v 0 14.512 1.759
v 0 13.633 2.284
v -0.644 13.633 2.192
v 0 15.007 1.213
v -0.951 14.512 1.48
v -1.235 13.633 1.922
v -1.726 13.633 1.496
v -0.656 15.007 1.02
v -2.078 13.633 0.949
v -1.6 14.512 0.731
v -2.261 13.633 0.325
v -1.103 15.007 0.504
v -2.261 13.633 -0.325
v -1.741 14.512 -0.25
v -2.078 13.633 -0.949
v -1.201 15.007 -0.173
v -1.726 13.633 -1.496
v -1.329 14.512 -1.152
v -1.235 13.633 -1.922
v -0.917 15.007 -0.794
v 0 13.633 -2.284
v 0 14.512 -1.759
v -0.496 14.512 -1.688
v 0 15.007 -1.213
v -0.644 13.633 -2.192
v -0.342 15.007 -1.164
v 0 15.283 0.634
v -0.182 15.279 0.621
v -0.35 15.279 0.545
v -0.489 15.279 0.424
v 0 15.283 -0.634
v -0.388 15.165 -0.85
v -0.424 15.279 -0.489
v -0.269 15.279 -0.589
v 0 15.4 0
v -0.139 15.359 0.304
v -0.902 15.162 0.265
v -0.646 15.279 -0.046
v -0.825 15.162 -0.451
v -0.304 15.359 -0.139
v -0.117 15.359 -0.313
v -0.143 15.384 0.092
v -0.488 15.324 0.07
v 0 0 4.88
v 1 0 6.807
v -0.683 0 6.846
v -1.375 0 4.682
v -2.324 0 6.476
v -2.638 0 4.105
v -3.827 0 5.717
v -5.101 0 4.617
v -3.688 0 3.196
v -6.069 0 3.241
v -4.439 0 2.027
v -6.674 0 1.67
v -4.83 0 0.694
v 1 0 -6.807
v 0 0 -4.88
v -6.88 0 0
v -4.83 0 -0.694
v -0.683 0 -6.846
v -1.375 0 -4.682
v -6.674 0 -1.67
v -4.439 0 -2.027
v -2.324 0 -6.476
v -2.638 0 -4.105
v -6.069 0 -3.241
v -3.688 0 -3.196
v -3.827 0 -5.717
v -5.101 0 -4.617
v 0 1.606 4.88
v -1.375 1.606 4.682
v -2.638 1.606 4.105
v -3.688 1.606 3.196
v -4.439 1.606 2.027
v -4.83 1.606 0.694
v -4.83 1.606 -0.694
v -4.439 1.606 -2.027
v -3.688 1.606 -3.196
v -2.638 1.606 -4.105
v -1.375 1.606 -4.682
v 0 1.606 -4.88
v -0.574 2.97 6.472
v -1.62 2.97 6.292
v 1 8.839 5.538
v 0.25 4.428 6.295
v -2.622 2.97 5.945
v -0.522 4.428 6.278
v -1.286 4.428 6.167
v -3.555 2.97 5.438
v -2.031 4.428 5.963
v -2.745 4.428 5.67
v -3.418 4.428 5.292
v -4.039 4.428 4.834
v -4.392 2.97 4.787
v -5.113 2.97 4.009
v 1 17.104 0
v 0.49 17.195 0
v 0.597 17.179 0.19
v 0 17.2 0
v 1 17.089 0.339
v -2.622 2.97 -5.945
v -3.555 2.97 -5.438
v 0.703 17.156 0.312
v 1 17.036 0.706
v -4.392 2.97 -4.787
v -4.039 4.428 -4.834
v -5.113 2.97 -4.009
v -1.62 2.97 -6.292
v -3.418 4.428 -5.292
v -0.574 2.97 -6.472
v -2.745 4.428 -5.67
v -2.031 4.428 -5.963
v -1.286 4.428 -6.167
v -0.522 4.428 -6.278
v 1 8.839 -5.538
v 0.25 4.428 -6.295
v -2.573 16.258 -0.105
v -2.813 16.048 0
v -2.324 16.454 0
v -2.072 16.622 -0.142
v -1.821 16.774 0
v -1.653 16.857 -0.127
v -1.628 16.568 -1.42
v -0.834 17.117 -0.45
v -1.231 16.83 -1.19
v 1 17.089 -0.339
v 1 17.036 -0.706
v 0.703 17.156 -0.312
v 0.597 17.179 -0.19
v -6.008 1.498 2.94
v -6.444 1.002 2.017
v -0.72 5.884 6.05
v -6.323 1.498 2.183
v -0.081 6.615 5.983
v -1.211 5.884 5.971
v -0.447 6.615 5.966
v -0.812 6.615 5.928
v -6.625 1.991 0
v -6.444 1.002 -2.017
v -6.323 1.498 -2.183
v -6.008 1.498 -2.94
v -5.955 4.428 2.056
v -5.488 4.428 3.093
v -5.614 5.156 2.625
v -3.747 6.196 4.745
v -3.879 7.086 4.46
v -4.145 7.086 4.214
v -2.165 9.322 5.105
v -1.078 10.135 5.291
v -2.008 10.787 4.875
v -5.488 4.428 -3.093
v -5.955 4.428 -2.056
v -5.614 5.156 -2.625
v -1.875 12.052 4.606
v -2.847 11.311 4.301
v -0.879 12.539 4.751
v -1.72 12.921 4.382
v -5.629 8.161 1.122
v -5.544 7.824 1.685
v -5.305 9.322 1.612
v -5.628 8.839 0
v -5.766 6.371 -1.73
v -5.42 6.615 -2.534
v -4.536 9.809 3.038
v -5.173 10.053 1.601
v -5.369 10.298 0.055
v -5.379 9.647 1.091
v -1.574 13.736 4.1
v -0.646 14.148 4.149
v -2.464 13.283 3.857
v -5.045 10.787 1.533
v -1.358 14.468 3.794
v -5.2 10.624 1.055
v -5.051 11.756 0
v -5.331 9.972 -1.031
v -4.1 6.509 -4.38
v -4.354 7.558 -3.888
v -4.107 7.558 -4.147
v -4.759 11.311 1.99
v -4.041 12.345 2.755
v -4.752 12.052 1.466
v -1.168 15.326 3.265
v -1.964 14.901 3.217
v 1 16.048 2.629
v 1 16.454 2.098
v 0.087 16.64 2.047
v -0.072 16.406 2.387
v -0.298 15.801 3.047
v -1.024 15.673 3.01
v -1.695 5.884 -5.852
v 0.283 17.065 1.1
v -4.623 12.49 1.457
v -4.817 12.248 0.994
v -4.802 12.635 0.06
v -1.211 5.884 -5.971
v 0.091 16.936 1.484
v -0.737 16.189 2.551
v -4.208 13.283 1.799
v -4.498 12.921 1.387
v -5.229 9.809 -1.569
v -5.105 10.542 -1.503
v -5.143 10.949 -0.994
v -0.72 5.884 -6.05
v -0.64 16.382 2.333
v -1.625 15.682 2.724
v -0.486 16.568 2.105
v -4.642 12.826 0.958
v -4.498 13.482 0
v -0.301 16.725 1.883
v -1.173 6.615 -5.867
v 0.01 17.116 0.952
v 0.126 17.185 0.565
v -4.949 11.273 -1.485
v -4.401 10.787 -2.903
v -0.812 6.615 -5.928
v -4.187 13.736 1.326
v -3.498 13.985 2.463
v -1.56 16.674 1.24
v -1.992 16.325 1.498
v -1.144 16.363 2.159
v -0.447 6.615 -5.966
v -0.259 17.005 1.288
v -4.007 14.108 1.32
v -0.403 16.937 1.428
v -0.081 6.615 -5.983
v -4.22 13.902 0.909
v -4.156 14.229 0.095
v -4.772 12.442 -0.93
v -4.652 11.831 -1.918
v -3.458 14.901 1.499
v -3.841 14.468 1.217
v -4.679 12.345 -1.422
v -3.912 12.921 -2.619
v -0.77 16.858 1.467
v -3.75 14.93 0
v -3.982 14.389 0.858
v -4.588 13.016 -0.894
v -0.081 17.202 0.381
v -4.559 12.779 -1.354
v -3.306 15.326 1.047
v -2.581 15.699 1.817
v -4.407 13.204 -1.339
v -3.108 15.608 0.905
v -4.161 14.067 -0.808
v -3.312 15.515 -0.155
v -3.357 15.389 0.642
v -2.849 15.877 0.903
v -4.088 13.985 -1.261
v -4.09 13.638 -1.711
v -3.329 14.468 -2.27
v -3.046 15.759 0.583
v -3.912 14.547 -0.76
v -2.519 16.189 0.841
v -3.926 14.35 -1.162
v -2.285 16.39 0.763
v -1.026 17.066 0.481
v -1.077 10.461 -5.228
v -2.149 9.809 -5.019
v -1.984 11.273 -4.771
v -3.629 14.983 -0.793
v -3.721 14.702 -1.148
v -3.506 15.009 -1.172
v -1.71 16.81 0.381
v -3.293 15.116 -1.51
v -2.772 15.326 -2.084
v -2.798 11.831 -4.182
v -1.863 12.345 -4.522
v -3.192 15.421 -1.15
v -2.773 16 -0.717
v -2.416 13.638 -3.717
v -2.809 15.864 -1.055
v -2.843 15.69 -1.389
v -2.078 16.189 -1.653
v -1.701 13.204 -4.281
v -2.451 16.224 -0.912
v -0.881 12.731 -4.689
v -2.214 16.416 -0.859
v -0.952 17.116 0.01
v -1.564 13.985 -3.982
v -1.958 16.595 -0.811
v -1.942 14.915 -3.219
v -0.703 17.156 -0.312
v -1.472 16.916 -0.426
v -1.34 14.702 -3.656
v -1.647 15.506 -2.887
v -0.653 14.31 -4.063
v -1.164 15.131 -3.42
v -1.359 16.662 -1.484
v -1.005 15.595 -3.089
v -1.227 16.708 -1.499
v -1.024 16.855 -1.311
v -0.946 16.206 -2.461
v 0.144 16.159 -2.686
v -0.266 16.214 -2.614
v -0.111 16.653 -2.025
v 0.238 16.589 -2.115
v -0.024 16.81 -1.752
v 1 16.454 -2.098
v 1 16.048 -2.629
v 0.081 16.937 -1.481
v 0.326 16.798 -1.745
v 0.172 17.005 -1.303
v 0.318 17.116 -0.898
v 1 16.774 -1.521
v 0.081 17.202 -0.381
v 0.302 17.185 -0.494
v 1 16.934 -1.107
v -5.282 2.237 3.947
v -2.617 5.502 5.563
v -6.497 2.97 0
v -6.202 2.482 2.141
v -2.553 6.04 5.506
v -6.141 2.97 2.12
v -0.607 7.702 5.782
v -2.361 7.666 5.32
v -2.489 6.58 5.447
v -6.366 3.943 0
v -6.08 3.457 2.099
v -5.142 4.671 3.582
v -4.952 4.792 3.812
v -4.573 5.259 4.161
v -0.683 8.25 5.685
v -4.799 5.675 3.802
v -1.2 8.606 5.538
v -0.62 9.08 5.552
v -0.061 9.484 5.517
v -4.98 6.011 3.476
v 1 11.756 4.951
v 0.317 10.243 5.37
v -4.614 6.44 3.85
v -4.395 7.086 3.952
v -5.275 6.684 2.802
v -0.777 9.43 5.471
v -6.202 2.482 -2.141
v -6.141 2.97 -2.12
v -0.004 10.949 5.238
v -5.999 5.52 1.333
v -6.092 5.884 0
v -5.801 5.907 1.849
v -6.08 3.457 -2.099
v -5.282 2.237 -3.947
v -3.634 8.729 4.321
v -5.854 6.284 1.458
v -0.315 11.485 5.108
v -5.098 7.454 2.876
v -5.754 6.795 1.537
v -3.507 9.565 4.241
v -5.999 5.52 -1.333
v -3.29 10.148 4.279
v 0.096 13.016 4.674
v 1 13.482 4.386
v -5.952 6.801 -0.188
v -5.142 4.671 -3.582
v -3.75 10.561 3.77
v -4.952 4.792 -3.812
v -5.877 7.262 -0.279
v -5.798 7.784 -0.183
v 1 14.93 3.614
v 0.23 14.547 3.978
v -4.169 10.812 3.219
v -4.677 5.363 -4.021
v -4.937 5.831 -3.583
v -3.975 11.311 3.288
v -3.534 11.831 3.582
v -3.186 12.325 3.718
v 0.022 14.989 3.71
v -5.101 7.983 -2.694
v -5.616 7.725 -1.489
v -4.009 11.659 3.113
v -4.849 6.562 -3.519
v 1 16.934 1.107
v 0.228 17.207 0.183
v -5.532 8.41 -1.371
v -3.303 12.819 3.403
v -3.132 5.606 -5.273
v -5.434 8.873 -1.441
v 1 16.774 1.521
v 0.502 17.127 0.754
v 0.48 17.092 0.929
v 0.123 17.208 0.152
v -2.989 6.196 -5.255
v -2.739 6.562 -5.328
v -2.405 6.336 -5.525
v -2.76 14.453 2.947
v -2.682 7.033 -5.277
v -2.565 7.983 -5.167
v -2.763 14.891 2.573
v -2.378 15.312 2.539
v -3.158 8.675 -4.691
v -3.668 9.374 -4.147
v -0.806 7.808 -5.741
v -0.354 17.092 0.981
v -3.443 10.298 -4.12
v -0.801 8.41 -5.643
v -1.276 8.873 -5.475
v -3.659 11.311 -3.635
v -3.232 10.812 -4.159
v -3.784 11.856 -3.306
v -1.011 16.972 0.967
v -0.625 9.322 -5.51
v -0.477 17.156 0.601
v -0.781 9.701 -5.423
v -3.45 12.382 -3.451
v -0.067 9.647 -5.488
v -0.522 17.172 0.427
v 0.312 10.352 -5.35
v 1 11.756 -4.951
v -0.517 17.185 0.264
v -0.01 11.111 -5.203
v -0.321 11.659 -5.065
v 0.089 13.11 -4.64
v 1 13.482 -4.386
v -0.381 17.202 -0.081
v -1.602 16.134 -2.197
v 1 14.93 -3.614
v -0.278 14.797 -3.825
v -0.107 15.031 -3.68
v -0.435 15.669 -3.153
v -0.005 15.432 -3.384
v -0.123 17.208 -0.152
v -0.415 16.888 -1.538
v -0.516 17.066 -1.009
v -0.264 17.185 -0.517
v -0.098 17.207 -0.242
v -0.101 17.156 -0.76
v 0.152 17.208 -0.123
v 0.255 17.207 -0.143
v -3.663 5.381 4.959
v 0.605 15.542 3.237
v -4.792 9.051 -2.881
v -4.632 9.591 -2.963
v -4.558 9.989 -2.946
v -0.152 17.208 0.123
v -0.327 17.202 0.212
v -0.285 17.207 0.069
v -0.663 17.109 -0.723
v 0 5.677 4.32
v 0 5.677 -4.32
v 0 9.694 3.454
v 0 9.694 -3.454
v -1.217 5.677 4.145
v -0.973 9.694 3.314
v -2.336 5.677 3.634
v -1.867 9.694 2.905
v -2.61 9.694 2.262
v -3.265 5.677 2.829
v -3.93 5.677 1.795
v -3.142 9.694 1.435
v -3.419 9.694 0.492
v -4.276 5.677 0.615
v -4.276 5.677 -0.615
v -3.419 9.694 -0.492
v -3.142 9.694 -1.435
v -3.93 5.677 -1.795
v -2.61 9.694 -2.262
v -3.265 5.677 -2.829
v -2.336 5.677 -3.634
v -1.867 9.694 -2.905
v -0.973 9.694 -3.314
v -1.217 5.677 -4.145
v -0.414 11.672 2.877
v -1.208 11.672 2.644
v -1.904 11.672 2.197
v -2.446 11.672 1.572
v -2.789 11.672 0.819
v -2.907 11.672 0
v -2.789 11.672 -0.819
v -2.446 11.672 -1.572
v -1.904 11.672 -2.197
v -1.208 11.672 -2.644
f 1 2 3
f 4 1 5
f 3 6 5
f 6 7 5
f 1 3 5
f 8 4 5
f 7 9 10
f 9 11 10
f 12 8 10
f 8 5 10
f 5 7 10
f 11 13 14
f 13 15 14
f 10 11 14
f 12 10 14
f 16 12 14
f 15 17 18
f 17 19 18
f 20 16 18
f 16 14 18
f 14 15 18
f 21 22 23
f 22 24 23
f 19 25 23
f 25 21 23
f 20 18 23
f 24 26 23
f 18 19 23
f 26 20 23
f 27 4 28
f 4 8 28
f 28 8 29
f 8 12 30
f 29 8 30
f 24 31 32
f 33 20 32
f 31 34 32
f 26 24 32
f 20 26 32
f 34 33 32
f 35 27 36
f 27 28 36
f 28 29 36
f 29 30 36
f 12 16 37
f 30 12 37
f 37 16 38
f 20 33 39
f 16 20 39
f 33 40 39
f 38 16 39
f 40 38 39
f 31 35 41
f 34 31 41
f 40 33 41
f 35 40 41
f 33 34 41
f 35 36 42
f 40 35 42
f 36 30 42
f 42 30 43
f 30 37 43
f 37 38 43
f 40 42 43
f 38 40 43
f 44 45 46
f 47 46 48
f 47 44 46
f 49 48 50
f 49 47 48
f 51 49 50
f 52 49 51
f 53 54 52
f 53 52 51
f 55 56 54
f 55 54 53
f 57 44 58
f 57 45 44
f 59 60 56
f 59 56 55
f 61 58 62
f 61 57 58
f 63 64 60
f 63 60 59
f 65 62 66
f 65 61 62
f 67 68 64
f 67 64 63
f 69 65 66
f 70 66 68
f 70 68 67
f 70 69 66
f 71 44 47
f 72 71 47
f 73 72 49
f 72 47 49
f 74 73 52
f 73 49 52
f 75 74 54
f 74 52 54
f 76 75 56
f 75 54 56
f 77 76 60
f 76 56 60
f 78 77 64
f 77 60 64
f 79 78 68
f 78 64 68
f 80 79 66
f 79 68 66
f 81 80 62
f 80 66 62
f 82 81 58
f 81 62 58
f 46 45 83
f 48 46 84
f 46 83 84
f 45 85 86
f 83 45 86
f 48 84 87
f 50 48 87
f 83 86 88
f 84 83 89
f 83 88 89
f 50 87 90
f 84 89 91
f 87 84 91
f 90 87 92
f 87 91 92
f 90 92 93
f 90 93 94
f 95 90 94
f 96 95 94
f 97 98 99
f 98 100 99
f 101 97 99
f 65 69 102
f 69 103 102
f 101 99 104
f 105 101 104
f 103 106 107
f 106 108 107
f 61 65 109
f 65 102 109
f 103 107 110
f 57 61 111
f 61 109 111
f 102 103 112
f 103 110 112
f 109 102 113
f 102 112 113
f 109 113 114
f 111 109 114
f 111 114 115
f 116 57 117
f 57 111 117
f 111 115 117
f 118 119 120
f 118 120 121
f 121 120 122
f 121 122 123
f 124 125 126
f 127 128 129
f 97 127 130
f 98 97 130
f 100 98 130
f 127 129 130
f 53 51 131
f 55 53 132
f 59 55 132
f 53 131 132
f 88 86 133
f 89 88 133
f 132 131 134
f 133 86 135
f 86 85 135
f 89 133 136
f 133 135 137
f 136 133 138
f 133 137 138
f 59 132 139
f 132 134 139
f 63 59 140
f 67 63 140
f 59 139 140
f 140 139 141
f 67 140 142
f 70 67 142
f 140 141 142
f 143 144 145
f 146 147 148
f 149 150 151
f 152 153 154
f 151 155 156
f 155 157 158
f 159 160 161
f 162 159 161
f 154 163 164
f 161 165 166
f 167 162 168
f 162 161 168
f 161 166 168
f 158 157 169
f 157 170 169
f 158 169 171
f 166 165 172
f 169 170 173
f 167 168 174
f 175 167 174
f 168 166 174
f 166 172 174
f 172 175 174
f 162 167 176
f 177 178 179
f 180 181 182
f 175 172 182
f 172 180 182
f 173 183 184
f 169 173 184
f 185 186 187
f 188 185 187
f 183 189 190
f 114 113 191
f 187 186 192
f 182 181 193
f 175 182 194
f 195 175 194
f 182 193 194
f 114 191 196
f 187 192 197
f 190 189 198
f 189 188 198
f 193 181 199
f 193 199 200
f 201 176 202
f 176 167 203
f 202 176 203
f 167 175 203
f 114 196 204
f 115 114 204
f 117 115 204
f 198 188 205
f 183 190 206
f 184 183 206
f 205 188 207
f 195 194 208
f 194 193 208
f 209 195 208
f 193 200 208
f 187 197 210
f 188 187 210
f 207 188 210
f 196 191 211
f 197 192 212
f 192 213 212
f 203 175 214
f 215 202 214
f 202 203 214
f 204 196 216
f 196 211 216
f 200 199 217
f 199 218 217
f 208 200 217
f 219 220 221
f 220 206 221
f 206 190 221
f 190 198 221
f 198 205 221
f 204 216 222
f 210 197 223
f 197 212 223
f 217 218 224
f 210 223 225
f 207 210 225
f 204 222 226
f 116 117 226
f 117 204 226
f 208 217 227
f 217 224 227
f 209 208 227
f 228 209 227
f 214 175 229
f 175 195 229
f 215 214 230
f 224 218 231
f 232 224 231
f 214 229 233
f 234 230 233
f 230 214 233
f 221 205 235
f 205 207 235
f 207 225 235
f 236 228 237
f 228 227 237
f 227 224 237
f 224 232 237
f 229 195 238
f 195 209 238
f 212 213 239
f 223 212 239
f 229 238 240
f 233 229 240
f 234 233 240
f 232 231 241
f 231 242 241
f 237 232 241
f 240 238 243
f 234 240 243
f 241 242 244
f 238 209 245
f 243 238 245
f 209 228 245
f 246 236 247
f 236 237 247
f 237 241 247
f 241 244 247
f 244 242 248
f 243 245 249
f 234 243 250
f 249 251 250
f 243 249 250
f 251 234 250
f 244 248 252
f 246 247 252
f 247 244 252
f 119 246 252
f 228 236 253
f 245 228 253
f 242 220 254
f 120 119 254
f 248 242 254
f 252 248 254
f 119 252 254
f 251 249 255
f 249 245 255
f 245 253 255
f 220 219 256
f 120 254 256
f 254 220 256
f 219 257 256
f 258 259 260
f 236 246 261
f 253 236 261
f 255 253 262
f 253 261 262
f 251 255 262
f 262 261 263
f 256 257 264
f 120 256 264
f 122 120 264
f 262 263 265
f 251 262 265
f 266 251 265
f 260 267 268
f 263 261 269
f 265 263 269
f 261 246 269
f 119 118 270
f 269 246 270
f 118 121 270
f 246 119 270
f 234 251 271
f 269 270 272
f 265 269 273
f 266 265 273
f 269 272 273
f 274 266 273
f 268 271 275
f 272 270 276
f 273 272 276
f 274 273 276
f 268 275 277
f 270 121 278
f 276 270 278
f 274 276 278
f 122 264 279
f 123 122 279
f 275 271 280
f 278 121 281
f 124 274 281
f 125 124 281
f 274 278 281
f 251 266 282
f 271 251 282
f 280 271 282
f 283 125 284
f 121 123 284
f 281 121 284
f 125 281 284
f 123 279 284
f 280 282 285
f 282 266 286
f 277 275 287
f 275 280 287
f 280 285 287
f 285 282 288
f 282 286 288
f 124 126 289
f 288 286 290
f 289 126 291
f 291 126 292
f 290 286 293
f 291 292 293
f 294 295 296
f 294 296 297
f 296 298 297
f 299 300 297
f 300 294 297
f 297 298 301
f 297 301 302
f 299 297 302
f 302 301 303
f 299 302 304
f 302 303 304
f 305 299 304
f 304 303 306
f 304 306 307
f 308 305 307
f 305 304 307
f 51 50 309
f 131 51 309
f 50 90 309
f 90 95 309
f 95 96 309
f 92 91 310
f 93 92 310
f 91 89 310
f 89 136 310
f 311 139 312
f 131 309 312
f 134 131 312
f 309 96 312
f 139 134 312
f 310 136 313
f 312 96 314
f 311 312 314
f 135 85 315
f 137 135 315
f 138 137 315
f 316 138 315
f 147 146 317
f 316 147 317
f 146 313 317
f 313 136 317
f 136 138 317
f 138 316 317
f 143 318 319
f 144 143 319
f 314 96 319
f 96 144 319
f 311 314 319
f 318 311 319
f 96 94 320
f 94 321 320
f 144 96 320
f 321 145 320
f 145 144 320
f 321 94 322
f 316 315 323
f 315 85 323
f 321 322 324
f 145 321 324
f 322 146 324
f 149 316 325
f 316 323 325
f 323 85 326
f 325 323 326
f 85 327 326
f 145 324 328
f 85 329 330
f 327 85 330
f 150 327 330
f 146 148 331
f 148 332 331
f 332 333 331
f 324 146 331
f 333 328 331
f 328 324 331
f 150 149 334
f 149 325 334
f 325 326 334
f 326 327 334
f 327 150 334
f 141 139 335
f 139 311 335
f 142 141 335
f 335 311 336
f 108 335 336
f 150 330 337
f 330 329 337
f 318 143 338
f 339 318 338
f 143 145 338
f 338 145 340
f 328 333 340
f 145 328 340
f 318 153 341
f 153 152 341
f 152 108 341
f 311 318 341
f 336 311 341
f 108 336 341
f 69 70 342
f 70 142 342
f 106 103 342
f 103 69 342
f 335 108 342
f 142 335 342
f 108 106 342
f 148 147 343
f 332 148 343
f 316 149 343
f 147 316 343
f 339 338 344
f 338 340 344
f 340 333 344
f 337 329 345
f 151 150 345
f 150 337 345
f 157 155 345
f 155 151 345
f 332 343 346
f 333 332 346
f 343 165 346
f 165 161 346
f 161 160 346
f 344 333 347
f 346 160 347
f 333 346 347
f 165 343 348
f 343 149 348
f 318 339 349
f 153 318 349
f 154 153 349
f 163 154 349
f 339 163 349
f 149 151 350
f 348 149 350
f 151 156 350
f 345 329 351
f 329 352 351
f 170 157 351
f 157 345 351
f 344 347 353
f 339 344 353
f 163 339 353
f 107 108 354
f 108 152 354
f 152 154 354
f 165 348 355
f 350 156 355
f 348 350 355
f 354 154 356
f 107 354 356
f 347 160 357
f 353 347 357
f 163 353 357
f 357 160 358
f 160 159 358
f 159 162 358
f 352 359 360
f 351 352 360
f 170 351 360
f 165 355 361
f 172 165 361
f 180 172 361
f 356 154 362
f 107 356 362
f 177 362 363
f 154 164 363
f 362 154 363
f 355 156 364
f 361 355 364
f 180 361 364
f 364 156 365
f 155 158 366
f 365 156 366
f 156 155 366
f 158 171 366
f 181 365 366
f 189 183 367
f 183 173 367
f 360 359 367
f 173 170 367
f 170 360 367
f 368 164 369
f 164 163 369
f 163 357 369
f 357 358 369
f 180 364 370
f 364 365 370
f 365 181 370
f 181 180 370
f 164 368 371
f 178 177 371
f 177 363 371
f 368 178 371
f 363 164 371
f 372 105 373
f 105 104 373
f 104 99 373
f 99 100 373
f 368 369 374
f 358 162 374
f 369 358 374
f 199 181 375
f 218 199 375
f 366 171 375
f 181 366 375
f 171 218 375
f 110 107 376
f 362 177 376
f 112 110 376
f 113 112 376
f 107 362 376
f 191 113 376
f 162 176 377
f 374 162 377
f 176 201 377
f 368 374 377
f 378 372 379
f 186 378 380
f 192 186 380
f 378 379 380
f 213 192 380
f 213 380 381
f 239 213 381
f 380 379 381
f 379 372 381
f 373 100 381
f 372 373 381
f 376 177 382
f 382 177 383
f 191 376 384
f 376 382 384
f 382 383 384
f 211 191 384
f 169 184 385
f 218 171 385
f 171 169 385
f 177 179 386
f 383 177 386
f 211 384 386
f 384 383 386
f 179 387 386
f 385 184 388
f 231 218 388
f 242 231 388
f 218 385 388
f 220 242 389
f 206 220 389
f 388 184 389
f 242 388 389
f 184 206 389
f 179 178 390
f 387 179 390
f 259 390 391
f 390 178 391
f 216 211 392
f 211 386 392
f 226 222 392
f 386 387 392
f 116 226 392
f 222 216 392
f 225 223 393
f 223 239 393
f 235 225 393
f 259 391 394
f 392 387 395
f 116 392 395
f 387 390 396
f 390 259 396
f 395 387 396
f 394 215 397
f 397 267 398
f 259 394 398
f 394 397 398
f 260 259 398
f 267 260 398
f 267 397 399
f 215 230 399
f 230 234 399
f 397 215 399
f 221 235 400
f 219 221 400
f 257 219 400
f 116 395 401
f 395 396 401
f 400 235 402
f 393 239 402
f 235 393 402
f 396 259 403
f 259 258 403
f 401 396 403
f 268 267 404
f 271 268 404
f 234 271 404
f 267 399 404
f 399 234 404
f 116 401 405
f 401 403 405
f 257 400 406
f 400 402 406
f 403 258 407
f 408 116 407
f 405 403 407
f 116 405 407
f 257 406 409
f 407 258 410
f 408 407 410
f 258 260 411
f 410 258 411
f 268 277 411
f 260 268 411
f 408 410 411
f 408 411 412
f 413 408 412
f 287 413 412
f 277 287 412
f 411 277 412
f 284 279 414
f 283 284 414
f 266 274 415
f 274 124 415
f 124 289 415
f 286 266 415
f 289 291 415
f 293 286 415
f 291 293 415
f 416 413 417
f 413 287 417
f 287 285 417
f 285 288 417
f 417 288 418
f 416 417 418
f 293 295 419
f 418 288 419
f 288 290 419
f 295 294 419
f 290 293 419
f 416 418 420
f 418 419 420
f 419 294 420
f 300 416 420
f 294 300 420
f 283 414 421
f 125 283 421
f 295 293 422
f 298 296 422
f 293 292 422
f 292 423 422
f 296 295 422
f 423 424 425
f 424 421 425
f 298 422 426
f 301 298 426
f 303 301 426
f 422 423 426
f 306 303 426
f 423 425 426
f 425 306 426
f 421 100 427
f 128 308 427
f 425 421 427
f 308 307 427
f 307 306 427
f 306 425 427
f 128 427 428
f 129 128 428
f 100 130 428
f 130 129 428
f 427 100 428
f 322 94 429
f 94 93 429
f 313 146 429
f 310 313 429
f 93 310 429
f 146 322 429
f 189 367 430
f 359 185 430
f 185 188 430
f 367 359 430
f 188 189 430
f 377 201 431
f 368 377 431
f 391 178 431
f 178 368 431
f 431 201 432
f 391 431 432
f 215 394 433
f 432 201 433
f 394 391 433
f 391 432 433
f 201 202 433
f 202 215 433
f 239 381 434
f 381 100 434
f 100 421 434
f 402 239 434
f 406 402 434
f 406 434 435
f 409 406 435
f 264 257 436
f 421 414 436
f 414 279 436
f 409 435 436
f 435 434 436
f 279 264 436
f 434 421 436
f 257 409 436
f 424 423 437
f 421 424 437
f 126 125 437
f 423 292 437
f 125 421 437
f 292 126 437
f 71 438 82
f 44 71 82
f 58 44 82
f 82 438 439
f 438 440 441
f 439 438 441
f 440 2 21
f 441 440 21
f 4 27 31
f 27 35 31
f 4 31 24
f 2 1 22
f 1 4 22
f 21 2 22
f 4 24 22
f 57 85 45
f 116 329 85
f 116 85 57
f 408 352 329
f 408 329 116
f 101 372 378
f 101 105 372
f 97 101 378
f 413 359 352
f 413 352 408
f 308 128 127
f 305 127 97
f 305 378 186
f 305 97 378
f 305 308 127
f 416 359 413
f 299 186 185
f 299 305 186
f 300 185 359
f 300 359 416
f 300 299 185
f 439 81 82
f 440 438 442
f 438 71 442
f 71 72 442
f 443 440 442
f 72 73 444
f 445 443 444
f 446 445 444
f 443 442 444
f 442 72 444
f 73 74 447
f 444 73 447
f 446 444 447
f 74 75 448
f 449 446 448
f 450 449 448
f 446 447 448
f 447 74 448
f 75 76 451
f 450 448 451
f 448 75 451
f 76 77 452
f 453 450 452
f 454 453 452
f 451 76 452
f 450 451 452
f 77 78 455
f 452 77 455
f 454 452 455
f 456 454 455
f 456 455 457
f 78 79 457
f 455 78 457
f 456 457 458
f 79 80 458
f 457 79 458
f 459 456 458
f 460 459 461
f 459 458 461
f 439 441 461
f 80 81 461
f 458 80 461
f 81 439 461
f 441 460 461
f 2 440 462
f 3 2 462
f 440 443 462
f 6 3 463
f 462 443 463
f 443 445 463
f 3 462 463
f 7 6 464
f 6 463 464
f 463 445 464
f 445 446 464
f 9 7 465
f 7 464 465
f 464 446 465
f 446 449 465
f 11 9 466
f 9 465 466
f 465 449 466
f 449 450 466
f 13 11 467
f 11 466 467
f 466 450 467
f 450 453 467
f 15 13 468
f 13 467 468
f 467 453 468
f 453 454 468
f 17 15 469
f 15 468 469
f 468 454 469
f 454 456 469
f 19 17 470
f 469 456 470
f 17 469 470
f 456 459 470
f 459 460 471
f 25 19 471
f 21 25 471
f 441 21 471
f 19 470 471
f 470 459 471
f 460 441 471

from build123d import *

# Parameters (mm, degrees)
SKETCH5_W                = 5
SKETCH5_H                = 18
CUT_EXTRUDE4_DEPTH       = 20
REVOLVE3_ANGLE           = 90
REVOLVE3_OTHER_WAY_ANGLE = 90
SKETCH12_W               = 15.157920946
SKETCH12_H               = 18.962900337
CUT_EXTRUDE5_DEPTH       = 9


with BuildPart() as part:
    # Sketch1 → Revolve1 (revolve)
    with BuildSketch(Plane.XY):
        with BuildLine():
            Line((4.88, 0), (6.88, 0))
            add(Edge.make_bspline(
                [(6.88, 0), (6.476901655, 3.177692832), (5.808868292, 8.357754247), (4.378289276, 15.464596201), (1.111060579, 17.280233516), (0, 17.2)],
                knots=[0, 0, 0, 0, 0.473754928, 0.838492431, 1, 1, 1, 1], degree=3))
            Line((0, 17.2), (0, 15.4))
            add(Edge.make_bspline(
                [(0, 15.4), (1.563029619, 15.297760208), (2.284243197, 13.63319745)],
                knots=[0, 0, 0, 1, 1, 1], degree=2))
            add(Edge.make_bspline(
                [(2.284243197, 13.63319745), (4.266259497, 7.778351244), (4.88, 1.606249126)],
                knots=[0, 0, 0, 1, 1, 1], degree=2))
            ThreePointArc((4.88, 1.606249126), (4.905839008, 0.803124563), (4.88, 0))
        make_face()
    revolve(axis=Axis((0, 18.057905706, 0), (0, -1, 0)))

    # Sketch5 → Cut-Extrude4 (cut)
    with BuildSketch(Plane.XZ):
        with Locations((4.5, 0.912005105)):
            Rectangle(SKETCH5_W, SKETCH5_H)
    extrude(amount=-CUT_EXTRUDE4_DEPTH, mode=Mode.SUBTRACT)

    # Sketch9 → Revolve3 (revolve)
    with BuildSketch(Plane.XY):
        with BuildLine():
            Line((0, 17.2), (0, 0))
            Line((0, 0), (4.88, 0))
            Line((4.88, 0), (6.88, 0))
            add(Edge.make_bspline(
                [(6.88, 0), (6.476901655, 3.177692832), (5.808868292, 8.357754247), (4.378289276, 15.464596201), (1.111060579, 17.280233516), (0, 17.2)],
                knots=[0, 0, 0, 0, 0.473754928, 0.838492431, 1, 1, 1, 1], degree=3))
        make_face()
    revolve(axis=Axis((0, 17.2, 0), (0, -1, 0)), revolution_arc=REVOLVE3_ANGLE)

    # Sketch9 → Revolve3 other way (revolve)
    with BuildSketch(Plane.XY):
        with BuildLine():
            Line((0, 17.2), (0, 0))
            Line((0, 0), (4.88, 0))
            Line((4.88, 0), (6.88, 0))
            add(Edge.make_bspline(
                [(6.88, 0), (6.476901655, 3.177692832), (5.808868292, 8.357754247), (4.378289276, 15.464596201), (1.111060579, 17.280233516), (0, 17.2)],
                knots=[0, 0, 0, 0, 0.473754928, 0.838492431, 1, 1, 1, 1], degree=3))
        make_face()
    revolve(axis=Axis((0, 17.2, 0), (0, 1, 0)), revolution_arc=REVOLVE3_OTHER_WAY_ANGLE)

    # Sketch12 → Cut-Extrude5 (cut)
    with BuildSketch(Plane(origin=(10, 0, 0), x_dir=(0, 0, -1), z_dir=(1, 0, 0))):
        with Locations((0, 8.631516603)):
            Rectangle(SKETCH12_W, SKETCH12_H)
    extrude(amount=-CUT_EXTRUDE5_DEPTH, mode=Mode.SUBTRACT)


solid = part.part
